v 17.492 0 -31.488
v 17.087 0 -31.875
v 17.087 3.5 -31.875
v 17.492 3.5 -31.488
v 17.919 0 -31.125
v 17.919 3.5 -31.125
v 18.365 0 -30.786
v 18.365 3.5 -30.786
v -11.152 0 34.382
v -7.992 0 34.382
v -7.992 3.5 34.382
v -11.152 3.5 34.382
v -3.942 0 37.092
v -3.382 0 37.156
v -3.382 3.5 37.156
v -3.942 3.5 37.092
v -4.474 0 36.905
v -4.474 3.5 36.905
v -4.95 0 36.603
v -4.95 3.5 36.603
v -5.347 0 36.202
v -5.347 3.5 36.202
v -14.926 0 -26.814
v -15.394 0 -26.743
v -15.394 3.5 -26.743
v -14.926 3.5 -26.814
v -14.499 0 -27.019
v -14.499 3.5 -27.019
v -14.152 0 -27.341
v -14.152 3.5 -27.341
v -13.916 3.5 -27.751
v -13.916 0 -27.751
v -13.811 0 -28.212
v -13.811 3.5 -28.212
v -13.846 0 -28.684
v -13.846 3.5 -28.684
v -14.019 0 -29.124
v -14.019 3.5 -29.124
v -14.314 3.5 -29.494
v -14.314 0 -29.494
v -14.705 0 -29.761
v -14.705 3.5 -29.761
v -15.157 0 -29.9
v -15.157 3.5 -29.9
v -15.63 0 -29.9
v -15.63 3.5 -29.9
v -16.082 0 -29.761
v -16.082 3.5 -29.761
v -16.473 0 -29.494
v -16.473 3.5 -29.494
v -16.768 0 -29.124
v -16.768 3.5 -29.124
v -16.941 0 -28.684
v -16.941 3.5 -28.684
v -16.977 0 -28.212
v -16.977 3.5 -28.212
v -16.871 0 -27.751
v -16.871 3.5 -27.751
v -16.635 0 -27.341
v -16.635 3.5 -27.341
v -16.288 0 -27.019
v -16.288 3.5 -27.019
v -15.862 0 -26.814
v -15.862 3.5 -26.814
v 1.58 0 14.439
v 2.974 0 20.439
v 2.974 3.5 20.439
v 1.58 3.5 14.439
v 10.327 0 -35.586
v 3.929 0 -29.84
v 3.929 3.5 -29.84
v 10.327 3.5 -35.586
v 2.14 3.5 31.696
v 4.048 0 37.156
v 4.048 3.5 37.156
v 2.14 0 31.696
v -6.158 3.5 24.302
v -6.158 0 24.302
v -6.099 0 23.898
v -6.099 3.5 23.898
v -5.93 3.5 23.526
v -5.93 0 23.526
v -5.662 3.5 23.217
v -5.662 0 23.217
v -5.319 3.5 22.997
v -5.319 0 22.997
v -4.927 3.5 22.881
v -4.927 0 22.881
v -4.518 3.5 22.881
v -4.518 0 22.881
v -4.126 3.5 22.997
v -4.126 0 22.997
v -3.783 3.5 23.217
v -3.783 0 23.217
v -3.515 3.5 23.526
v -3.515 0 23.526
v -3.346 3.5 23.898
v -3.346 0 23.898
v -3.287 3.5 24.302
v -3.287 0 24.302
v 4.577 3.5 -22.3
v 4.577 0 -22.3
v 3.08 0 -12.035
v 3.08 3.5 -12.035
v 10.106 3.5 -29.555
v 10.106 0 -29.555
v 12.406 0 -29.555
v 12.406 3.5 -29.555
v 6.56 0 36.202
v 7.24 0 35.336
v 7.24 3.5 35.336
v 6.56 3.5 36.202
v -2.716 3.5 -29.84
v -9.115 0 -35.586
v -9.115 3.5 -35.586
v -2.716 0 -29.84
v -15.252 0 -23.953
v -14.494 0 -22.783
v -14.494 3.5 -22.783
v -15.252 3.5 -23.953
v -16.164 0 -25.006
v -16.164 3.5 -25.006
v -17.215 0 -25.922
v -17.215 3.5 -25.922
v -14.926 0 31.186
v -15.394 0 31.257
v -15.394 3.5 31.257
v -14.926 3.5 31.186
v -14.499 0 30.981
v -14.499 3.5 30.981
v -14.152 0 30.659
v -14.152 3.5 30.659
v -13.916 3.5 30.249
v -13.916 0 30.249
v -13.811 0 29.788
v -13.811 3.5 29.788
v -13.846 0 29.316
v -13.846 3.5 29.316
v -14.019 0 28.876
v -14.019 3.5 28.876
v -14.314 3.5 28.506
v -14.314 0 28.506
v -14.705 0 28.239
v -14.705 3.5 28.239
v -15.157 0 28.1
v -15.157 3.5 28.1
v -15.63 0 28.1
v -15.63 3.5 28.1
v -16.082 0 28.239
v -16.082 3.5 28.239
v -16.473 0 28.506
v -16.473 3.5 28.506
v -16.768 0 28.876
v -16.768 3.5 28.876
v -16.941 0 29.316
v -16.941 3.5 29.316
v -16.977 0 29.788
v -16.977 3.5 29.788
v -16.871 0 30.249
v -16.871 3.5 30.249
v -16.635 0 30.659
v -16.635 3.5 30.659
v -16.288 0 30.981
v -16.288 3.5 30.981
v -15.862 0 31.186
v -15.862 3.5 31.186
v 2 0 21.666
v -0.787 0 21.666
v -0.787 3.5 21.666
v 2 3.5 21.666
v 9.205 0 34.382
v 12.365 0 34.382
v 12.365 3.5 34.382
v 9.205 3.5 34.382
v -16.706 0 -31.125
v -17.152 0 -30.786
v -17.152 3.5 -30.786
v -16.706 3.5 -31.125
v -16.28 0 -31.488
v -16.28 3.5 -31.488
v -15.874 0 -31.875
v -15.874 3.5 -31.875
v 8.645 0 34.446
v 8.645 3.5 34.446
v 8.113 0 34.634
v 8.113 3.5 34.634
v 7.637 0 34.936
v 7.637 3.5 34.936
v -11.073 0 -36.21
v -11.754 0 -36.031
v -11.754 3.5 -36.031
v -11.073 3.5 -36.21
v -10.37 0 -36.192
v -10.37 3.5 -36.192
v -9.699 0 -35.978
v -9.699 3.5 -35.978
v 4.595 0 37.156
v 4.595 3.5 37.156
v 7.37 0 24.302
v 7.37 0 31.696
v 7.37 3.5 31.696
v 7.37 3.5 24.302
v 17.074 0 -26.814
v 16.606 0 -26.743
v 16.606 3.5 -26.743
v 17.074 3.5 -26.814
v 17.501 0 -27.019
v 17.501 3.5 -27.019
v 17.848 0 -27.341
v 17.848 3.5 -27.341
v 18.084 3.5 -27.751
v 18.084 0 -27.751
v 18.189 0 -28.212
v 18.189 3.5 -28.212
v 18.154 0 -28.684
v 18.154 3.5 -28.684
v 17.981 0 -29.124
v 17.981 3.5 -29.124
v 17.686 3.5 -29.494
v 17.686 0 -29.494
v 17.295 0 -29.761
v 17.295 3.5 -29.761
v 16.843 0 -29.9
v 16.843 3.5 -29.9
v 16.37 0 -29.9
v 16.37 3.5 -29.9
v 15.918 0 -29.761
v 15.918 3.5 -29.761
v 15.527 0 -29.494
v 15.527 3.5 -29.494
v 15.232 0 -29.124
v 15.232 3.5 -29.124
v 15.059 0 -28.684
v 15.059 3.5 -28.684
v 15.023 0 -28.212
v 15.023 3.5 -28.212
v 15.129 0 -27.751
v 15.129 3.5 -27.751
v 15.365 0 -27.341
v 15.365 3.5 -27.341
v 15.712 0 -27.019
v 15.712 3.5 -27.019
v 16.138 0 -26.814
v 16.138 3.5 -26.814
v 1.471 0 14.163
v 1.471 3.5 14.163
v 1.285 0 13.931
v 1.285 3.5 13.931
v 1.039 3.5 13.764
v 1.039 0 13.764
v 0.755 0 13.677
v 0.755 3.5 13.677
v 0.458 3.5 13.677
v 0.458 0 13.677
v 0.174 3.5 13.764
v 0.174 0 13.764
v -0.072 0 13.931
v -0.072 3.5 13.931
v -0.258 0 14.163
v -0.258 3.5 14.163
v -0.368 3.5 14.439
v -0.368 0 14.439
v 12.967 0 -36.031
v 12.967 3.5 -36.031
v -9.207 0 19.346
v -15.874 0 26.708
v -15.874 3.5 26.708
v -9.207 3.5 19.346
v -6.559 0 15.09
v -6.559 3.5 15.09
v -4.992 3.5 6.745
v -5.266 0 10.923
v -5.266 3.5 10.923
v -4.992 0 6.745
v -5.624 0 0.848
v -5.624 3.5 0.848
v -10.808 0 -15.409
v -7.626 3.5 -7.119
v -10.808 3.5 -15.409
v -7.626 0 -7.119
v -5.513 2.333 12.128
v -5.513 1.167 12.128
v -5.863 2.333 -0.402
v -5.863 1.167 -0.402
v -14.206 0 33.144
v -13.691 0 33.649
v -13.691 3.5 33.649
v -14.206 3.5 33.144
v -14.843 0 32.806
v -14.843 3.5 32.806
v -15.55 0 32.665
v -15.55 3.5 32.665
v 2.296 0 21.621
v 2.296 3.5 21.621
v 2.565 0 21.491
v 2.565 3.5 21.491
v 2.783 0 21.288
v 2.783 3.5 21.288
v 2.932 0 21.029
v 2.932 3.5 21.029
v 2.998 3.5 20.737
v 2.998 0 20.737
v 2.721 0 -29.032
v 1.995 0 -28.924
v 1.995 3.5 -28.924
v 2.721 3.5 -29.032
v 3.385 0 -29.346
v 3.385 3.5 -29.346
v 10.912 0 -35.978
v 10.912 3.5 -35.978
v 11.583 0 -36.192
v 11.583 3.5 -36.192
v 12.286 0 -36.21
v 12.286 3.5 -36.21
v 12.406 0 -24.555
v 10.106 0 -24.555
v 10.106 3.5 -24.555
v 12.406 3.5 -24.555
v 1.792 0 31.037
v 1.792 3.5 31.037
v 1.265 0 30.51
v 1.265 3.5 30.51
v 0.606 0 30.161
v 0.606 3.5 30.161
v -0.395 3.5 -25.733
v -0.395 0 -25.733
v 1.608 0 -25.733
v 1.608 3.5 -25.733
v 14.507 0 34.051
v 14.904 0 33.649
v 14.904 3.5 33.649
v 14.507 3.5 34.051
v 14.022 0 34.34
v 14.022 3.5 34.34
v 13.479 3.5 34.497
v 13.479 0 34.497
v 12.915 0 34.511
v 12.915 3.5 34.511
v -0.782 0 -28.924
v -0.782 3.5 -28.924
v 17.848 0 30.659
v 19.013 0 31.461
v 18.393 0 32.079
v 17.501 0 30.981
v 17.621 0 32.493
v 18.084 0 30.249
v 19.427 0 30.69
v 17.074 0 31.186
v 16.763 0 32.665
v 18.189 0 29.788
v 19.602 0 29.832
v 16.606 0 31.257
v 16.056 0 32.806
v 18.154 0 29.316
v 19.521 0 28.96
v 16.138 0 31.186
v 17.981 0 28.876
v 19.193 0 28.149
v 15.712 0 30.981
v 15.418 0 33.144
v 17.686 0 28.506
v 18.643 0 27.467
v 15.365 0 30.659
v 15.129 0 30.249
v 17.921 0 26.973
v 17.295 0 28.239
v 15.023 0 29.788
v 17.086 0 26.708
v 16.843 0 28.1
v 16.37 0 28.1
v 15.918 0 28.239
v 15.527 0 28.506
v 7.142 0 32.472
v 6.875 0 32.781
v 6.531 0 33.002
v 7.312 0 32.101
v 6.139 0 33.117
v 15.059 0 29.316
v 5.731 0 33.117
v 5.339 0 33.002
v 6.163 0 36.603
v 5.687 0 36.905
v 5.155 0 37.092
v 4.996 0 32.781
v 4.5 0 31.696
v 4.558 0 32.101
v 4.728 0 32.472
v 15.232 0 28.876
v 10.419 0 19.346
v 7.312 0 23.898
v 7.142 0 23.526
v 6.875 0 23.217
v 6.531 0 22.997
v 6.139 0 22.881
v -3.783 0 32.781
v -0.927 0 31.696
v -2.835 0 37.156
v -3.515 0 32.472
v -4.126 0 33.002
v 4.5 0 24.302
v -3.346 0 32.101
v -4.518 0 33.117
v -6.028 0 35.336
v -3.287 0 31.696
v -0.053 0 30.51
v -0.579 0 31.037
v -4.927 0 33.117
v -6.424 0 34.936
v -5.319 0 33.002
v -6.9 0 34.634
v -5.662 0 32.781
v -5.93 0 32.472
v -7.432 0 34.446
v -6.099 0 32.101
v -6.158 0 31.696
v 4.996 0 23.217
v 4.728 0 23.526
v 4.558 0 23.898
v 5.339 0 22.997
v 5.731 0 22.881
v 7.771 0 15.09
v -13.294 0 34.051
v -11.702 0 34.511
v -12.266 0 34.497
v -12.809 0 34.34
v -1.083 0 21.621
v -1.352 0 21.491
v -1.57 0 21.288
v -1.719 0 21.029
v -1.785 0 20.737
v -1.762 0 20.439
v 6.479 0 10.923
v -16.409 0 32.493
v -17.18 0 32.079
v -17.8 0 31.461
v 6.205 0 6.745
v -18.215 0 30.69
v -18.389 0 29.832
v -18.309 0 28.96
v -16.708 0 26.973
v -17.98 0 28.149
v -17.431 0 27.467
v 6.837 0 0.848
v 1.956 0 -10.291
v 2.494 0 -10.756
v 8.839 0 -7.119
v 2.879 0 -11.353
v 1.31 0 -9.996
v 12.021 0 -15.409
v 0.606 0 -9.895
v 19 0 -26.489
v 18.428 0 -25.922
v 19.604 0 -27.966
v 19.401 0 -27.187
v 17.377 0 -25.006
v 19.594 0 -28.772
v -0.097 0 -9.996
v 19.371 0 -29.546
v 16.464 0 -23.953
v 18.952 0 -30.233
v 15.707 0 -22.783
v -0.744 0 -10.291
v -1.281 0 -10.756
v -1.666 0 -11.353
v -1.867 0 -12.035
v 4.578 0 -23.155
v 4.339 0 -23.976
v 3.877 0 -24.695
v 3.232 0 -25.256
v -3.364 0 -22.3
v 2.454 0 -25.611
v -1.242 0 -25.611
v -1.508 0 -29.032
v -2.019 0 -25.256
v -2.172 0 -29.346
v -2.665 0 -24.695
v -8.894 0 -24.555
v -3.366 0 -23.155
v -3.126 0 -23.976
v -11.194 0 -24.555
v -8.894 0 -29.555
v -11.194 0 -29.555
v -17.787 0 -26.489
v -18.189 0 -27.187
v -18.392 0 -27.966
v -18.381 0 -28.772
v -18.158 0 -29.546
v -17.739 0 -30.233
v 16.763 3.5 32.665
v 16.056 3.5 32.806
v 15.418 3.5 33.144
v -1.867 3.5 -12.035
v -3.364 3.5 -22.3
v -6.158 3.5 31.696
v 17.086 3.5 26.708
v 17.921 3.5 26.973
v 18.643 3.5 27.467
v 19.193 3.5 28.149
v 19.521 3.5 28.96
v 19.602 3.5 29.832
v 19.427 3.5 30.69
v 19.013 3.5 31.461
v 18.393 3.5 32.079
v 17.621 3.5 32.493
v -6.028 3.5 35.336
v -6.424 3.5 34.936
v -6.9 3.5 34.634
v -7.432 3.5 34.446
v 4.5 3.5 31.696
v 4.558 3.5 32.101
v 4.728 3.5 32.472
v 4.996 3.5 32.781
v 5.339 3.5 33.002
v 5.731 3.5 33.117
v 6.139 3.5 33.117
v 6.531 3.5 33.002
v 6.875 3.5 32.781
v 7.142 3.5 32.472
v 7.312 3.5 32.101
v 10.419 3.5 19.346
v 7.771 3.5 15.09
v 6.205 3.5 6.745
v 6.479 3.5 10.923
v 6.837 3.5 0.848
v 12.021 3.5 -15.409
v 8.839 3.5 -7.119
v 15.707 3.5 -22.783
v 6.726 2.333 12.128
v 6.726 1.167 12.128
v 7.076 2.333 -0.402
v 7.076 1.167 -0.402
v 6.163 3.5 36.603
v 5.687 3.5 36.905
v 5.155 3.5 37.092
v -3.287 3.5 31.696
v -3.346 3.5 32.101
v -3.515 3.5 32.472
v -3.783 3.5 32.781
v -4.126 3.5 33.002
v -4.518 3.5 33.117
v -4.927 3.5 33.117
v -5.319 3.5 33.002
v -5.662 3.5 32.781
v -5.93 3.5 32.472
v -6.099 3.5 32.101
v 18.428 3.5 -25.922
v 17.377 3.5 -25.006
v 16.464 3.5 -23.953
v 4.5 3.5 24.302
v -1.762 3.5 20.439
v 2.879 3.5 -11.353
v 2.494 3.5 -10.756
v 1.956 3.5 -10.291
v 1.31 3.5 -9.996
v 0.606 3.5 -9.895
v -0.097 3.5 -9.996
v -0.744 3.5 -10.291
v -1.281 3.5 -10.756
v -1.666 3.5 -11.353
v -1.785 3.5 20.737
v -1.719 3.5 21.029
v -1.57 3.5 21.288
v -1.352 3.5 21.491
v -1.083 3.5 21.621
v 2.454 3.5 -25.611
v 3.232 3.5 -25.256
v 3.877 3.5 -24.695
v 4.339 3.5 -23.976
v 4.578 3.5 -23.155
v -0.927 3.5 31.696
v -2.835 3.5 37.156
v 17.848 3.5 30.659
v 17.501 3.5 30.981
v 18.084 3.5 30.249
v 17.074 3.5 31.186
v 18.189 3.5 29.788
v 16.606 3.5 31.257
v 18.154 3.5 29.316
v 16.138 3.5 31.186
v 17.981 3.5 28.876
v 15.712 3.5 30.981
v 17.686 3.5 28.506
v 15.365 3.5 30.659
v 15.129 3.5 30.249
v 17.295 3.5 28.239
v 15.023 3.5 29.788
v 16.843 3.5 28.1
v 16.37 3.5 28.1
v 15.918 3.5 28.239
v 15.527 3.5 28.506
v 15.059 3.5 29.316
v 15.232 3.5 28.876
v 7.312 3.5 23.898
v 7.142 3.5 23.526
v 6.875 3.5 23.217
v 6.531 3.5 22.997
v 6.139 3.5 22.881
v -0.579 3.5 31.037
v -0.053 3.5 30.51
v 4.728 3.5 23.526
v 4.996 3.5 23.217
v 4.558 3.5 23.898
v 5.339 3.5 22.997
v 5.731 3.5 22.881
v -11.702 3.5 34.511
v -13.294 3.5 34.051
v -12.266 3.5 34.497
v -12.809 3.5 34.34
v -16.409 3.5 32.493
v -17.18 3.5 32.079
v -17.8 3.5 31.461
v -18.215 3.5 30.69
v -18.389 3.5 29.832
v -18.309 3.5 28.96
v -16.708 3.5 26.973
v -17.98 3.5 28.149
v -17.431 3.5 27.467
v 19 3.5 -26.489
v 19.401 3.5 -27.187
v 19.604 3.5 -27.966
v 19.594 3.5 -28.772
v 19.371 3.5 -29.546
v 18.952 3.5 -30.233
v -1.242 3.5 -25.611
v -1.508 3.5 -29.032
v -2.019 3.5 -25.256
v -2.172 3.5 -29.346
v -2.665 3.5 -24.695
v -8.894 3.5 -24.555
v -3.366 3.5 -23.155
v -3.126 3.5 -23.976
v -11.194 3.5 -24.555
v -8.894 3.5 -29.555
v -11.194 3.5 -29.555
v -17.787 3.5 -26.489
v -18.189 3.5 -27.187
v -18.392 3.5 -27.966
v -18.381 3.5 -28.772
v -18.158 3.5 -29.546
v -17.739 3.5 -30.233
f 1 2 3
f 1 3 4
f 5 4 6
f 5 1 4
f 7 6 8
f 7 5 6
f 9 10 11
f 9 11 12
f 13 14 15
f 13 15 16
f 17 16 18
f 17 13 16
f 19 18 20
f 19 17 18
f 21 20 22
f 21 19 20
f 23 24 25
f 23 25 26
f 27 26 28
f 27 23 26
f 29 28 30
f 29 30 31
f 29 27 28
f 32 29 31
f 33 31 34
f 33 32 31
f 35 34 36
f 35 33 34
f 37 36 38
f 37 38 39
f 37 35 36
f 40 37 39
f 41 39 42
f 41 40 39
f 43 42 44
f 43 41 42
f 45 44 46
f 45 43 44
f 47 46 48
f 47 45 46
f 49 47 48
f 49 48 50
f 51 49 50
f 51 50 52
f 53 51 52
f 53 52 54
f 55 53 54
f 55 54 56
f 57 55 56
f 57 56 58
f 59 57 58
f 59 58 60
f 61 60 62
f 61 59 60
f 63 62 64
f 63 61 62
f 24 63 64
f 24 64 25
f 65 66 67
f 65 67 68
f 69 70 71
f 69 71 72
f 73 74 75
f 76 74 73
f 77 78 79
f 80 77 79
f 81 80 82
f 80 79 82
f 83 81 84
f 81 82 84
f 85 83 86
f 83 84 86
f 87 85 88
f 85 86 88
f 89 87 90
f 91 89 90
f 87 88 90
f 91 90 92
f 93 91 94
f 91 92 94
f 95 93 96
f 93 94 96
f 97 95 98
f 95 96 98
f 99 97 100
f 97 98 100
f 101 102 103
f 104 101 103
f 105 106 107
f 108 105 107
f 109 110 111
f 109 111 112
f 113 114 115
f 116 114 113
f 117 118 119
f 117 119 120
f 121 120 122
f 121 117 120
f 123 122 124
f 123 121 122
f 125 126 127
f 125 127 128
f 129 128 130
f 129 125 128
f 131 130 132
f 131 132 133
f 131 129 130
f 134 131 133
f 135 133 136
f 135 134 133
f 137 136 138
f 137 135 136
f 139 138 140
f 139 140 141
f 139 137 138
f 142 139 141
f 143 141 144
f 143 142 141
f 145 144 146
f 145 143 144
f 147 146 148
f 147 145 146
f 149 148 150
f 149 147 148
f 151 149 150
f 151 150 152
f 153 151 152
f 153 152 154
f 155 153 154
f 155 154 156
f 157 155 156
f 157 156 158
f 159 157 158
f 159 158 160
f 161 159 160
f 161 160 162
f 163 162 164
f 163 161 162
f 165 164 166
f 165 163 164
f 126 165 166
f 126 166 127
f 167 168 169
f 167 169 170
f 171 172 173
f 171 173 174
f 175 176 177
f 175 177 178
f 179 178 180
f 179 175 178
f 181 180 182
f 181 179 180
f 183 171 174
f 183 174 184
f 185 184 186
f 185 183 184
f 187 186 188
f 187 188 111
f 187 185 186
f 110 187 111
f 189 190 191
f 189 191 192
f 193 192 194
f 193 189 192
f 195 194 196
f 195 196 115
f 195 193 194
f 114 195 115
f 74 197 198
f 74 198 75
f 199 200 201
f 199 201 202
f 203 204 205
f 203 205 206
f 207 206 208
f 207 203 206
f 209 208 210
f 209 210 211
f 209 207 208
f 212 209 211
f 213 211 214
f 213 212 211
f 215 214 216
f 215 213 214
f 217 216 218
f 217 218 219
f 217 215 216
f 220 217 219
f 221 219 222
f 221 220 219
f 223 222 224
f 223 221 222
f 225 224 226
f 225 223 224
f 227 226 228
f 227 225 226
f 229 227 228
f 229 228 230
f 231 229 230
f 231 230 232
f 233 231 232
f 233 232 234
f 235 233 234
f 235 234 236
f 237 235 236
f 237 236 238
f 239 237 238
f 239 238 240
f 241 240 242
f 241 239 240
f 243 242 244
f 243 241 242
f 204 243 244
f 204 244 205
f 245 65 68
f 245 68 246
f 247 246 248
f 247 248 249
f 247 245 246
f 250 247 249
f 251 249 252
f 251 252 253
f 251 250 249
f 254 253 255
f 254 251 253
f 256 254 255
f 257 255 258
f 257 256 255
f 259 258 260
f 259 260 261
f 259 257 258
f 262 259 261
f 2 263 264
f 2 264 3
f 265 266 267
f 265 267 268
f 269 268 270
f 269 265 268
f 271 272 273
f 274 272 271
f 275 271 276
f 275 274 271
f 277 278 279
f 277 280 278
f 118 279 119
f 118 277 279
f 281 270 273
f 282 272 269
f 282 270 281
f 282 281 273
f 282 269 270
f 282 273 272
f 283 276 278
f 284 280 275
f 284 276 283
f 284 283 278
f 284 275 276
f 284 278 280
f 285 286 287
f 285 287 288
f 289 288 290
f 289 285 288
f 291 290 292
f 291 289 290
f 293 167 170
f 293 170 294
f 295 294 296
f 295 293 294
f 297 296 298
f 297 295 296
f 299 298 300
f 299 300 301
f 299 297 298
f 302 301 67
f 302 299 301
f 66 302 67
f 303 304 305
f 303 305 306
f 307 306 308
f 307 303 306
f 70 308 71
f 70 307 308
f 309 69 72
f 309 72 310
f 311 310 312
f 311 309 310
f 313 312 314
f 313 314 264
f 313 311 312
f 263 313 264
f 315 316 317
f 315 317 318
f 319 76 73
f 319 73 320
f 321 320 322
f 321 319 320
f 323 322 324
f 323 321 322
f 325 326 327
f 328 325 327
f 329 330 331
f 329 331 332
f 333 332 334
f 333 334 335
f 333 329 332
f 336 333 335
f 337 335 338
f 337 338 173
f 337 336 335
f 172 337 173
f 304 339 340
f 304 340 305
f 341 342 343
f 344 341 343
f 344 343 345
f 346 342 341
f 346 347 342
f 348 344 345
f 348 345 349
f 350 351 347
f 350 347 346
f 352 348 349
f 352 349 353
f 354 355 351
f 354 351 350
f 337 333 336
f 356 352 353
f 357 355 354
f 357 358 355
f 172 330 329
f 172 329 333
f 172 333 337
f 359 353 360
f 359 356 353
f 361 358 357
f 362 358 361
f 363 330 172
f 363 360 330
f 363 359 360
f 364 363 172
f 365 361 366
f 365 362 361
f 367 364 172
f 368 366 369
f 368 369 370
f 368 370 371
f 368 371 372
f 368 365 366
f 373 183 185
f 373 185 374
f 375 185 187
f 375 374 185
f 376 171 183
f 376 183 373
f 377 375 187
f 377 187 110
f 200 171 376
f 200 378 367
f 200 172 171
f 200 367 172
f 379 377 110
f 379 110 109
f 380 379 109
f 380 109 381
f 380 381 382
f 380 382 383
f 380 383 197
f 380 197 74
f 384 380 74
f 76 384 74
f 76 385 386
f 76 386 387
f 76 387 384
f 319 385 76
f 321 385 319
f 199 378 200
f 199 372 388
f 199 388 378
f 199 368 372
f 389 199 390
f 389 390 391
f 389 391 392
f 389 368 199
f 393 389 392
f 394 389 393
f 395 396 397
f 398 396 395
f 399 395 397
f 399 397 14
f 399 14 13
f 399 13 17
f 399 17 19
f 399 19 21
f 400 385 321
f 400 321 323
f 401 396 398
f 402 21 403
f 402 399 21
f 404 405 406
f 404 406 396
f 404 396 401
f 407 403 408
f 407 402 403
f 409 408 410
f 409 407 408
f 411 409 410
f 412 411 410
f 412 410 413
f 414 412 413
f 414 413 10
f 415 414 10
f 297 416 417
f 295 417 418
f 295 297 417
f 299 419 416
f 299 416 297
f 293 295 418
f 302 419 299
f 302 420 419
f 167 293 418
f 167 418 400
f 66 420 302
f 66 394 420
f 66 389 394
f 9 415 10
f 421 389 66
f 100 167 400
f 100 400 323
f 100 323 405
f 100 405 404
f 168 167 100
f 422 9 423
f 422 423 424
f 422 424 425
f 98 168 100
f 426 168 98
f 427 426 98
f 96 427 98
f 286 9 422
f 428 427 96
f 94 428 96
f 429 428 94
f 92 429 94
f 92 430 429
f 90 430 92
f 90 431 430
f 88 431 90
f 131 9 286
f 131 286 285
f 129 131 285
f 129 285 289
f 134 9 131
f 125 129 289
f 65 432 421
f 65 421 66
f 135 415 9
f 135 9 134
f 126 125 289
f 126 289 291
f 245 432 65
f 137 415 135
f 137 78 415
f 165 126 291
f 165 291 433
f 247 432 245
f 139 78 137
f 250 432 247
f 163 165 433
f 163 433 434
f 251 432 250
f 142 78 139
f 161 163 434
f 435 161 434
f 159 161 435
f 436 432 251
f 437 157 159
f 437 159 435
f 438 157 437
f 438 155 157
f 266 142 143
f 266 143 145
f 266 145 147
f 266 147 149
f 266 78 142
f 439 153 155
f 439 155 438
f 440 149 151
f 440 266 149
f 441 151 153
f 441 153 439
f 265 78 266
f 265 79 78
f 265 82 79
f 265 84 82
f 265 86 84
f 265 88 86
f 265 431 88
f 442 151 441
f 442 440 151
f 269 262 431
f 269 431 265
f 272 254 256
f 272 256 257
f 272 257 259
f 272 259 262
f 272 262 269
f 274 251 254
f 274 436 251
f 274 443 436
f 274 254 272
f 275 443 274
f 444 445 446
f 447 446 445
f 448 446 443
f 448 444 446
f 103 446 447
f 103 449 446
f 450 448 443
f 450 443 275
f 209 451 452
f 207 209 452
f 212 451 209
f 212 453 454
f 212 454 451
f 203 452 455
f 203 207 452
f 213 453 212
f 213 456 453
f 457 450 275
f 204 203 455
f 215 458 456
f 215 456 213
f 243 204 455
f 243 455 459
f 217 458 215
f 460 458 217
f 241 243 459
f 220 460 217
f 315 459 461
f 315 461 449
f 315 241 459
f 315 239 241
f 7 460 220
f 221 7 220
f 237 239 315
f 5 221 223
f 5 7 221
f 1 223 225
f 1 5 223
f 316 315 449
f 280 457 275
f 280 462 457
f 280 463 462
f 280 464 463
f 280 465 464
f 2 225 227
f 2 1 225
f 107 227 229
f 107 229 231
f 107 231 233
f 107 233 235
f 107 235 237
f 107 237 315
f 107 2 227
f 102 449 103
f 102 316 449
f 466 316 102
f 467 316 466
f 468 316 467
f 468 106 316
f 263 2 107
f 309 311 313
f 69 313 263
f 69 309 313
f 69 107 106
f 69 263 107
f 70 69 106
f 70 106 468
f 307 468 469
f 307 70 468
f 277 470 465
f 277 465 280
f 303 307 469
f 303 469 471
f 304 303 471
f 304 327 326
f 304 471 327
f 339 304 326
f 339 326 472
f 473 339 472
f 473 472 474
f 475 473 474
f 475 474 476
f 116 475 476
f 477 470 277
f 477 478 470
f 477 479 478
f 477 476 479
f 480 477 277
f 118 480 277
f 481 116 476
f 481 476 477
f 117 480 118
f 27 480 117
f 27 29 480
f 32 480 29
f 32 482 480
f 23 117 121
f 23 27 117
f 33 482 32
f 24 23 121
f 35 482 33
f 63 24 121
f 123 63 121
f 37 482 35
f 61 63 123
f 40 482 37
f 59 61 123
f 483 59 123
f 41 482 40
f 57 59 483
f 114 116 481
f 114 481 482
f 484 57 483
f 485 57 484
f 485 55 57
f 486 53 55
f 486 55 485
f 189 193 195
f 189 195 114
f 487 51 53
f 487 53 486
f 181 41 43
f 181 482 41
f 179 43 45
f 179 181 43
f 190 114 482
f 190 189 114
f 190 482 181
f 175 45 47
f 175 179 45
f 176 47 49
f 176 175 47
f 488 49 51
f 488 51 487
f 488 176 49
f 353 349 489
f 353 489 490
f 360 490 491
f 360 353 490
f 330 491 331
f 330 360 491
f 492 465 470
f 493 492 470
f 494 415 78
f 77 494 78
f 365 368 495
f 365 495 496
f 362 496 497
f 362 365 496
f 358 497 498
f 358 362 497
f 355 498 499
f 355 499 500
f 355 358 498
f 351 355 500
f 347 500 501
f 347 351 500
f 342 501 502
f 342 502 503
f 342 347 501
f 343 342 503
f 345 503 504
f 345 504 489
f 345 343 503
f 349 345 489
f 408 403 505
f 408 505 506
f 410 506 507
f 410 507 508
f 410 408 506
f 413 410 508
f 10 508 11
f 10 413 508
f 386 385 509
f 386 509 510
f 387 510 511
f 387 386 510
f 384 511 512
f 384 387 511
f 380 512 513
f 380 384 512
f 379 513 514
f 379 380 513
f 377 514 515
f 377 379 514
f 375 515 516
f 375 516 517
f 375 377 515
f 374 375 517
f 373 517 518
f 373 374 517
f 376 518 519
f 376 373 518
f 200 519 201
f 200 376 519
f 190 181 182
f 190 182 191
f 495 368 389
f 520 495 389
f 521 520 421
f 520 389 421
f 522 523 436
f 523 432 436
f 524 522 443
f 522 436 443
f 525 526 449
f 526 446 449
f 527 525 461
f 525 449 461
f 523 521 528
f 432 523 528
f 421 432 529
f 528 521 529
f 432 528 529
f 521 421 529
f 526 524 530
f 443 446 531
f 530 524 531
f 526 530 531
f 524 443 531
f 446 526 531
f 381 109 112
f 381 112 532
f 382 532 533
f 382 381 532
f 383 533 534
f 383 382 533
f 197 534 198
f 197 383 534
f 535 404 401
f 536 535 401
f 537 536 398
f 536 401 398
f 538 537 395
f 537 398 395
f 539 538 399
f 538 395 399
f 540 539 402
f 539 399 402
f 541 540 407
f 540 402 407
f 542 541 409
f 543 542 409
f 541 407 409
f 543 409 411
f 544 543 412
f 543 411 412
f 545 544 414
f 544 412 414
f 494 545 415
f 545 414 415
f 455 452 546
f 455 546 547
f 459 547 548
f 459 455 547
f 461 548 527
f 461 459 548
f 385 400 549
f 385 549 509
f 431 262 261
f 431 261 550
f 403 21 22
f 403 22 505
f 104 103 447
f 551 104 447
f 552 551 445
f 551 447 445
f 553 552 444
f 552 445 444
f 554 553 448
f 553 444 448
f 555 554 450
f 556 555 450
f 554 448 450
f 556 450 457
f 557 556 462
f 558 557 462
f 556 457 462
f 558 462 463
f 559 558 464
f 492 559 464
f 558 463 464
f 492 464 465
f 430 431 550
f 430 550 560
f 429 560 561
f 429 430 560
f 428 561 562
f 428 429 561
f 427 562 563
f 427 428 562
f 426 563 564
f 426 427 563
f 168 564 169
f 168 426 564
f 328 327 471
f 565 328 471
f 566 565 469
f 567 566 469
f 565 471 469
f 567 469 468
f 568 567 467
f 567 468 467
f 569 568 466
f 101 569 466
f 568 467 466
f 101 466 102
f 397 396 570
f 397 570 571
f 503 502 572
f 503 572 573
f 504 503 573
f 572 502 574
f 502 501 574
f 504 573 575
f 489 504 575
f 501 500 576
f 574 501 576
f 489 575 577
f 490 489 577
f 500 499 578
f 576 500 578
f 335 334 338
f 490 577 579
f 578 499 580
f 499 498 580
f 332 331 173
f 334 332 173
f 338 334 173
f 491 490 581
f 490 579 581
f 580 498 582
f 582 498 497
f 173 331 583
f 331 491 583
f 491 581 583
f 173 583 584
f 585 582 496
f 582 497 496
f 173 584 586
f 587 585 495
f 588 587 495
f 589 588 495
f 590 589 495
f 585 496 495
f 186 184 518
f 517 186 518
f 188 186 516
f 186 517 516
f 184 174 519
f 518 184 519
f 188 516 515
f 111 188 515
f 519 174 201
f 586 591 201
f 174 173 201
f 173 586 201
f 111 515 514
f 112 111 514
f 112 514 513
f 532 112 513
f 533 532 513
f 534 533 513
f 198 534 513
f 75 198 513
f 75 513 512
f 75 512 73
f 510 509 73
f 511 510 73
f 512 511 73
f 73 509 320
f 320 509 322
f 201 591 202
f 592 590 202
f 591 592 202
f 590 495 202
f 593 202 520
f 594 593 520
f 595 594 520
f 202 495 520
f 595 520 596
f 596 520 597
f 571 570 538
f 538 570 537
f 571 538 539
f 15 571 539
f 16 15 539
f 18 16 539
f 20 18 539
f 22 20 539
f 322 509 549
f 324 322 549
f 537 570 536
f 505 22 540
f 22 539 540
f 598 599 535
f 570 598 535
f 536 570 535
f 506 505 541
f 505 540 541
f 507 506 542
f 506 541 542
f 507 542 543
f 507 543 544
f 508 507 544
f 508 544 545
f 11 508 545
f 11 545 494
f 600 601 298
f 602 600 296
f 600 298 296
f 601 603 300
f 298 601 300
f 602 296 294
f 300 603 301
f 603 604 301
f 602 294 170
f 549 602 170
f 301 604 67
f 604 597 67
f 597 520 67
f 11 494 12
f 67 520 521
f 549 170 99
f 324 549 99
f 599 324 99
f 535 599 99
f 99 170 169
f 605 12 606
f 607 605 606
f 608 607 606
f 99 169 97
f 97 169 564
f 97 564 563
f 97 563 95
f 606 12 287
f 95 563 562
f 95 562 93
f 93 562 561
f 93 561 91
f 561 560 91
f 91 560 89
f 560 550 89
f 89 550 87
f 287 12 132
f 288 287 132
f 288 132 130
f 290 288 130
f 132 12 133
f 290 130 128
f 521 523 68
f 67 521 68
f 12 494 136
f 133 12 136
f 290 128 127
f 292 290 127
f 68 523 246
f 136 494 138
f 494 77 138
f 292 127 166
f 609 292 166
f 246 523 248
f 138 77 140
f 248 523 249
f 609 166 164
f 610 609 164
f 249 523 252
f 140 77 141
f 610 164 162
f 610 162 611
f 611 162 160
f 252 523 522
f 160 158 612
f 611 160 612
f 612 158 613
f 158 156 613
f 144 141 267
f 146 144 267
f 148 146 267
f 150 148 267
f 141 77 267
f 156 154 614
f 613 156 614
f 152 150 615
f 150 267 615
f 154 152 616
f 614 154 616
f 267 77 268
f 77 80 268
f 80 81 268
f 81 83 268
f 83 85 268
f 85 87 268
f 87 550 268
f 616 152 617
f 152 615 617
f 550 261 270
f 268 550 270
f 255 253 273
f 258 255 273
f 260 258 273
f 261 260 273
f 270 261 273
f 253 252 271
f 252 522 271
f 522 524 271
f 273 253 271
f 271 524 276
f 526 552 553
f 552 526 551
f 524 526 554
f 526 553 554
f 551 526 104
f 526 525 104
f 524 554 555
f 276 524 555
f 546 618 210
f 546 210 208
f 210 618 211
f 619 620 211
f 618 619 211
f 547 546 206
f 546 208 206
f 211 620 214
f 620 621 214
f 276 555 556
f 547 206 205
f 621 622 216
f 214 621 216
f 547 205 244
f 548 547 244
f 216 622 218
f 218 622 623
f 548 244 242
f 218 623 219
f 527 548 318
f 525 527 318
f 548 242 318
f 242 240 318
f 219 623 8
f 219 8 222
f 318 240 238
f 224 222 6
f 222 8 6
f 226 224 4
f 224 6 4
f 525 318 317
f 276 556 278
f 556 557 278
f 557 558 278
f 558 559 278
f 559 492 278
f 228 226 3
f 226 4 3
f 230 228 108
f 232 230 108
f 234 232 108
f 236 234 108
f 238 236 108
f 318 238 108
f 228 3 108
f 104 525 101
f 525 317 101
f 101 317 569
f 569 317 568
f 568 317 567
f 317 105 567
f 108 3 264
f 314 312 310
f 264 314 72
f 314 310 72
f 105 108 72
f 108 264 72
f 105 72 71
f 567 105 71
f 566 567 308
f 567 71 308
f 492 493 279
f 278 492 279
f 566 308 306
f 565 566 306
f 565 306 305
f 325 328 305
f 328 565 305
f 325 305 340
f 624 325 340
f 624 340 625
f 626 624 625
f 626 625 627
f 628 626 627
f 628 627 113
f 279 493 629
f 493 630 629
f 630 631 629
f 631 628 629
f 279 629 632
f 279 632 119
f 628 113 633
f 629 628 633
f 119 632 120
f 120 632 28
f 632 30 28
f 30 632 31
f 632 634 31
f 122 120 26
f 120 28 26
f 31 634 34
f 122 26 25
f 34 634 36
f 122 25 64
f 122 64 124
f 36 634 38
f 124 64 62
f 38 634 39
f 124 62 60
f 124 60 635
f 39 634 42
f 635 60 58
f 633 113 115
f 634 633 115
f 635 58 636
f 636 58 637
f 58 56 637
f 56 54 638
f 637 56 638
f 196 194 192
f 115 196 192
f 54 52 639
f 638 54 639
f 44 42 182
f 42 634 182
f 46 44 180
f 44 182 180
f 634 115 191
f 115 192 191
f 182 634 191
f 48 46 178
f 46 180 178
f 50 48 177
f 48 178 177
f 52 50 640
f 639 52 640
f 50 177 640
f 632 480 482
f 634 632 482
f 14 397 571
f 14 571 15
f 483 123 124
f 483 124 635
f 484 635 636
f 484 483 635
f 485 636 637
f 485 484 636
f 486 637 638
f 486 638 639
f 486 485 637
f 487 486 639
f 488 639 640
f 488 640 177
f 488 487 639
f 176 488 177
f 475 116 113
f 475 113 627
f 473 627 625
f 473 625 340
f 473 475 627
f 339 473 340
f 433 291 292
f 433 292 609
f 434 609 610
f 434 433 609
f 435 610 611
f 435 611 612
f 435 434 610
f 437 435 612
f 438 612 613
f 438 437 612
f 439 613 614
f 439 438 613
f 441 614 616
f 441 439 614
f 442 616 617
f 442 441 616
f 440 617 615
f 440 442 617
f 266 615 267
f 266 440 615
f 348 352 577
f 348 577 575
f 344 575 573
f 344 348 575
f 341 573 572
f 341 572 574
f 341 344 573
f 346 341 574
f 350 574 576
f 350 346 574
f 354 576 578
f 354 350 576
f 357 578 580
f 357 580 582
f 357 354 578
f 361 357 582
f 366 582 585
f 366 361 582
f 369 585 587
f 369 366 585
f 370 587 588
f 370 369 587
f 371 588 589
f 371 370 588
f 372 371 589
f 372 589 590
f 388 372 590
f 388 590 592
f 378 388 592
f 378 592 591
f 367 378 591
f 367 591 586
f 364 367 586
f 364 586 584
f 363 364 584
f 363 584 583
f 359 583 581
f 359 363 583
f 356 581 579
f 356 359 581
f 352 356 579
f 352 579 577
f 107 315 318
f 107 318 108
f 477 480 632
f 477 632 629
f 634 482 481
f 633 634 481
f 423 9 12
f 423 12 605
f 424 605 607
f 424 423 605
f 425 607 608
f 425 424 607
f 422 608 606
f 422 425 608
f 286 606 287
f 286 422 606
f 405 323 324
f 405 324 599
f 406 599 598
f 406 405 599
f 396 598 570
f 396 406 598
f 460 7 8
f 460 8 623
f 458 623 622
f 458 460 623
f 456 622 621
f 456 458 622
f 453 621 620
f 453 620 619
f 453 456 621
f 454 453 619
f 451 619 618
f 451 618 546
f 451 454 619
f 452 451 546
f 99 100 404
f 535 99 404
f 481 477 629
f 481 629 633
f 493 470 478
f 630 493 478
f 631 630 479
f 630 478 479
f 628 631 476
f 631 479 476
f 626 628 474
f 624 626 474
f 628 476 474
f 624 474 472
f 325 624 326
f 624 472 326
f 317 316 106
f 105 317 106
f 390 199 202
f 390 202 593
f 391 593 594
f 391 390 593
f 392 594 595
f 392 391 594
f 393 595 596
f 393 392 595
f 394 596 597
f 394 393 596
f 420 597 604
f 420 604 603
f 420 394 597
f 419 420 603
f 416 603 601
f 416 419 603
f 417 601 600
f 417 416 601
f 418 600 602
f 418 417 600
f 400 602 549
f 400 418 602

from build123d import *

# Parameters (mm, degrees)
CROQUIS1_R              = 1.5875
CROQUIS1_W              = 2.3
CROQUIS1_H              = 5
SALIENTE_EXTRUIR1_DEPTH = 3.5


with BuildPart() as part:
    # Croquis1 → Saliente-Extruir1 (new body)
    with BuildSketch(Plane(origin=(0, 0, 0), x_dir=(1, 0, 0), z_dir=(0, 1, 0))):
        with BuildLine():
            Line((-15.874295221, 31.874668373), (-11.754060701, 36.031005585))
            ThreePointArc((-11.754060701, 36.031005585), (-10.369805081, 36.191711772), (-9.114574915, 35.586412398))
            Line((-9.114574915, 35.586412398), (-2.716116368, 29.839829039))
            ThreePointArc((-2.716116368, 29.839829039), (-1.851993104, 29.164348948), (-0.781901657, 28.923752474))
            Line((-0.781901657, 28.923752474), (0.565649151, 28.923752474))
            Line((0.565649151, 28.923752474), (0.647095514, 28.923752474))
            Line((0.647095514, 28.923752474), (1.994646322, 28.923752474))
            ThreePointArc((1.994646322, 28.923752474), (3.06473777, 29.164348948), (3.928861034, 29.839829039))
            Line((3.928861034, 29.839829039), (10.327319581, 35.586412398))
            ThreePointArc((10.327319581, 35.586412398), (11.582549747, 36.191711772), (12.966805367, 36.031005585))
            Line((12.966805367, 36.031005585), (17.087039886, 31.874668373))
            ThreePointArc((17.087039886, 31.874668373), (17.703192062, 31.303268278), (18.365142407, 30.785616548))
            ThreePointArc((18.365142407, 30.785616548), (19.626123842, 28.369336027), (18.427544181, 25.921501773))
            ThreePointArc((18.427544181, 25.921501773), (16.902388008, 24.495249114), (15.706675307, 22.783358599))
            add(Edge.make_bspline(
                [(17.08637633, -26.708053998), (12.010093305, -21.41999504), (5.252678849, -14.724182661), (6.940083791, 4.589437635), (12.242427811, 16.518318459), (15.706675307, 22.783358599)],
                knots=[0, 0, 0, 0, 0.308743397, 0.525126437, 0.93919625, 0.93919625, 0.93919625, 0.93919625], degree=3))
            ThreePointArc((17.08637633, -26.708053998), (19.60196336, -29.831990985), (16.763044461, -32.665310574))
            ThreePointArc((16.763044461, -32.665310574), (15.724835901, -32.951926252), (14.903555585, -33.648721922))
            ThreePointArc((14.903555585, -33.648721922), (13.755521453, -34.435837646), (12.364591814, -34.382468459))
            Line((12.364591814, -34.382468459), (9.205112275, -34.382468459))
            ThreePointArc((9.205112275, -34.382468459), (8.113093326, -34.633581042), (7.240450136, -35.336472768))
            Line((7.240450136, -35.336472768), (6.559598907, -36.201703273))
            ThreePointArc((6.559598907, -36.201703273), (5.686955717, -36.904594998), (4.594936767, -37.155707581))
            Line((4.594936767, -37.155707581), (4.047588743, -37.155707581))
            Line((4.047588743, -37.155707581), (2.140229158, -31.696312325))
            ThreePointArc((2.140229158, -31.696312325), (1.548523338, -30.753735958), (0.606372333, -30.161353086))
            ThreePointArc((0.606372333, -30.161353086), (-0.335778672, -30.753735958), (-0.927484492, -31.696312325))
            Line((-0.927484492, -31.696312325), (-2.834844078, -37.155707581))
            Line((-2.834844078, -37.155707581), (-3.382192102, -37.155707581))
            ThreePointArc((-3.382192102, -37.155707581), (-4.474211051, -36.904594998), (-5.346854241, -36.201703273))
            Line((-5.346854241, -36.201703273), (-6.02770547, -35.336472768))
            ThreePointArc((-6.02770547, -35.336472768), (-6.90034866, -34.633581042), (-7.99236761, -34.382468459))
            Line((-7.99236761, -34.382468459), (-11.151847148, -34.382468459))
            ThreePointArc((-11.151847148, -34.382468459), (-12.542776787, -34.435837646), (-13.690810919, -33.648721922))
            ThreePointArc((-13.690810919, -33.648721922), (-14.512091235, -32.951926252), (-15.550299796, -32.665310574))
            ThreePointArc((-15.550299796, -32.665310574), (-18.389218694, -29.831990985), (-15.873631664, -26.708053998))
            add(Edge.make_bspline(
                [(-15.873631664, -26.708053998), (-10.797348639, -21.41999504), (-4.039934183, -14.724182661), (-5.727339125, 4.589437635), (-11.029683145, 16.518318459), (-14.493930641, 22.783358599)],
                knots=[0, 0, 0, 0, 0.308743397, 0.525126437, 0.93919625, 0.93919625, 0.93919625, 0.93919625], degree=3))
            ThreePointArc((-14.493930641, 22.783358599), (-15.689643342, 24.495249114), (-17.214799516, 25.921501773))
            ThreePointArc((-17.214799516, 25.921501773), (-18.413379177, 28.369336027), (-17.152397742, 30.785616548))
            ThreePointArc((-17.152397742, 30.785616548), (-16.490447396, 31.303268278), (-15.874295221, 31.874668373))
        make_face()
        with Locations(Location((16.606372333, -29.669404393, 0), (0, 0, 270))):
            Circle(CROQUIS1_R, mode=Mode.SUBTRACT)
        with Locations(Location((-15.393627667, 28.330595607, 0), (0, 0, 270))):
            Circle(CROQUIS1_R, mode=Mode.SUBTRACT)
        with Locations(Location((16.606372333, 28.330595607, 0), (0, 0, 270))):
            Circle(CROQUIS1_R, mode=Mode.SUBTRACT)
        with Locations(Location((-15.393627667, -29.669404393, 0), (0, 0, 270))):
            Circle(CROQUIS1_R, mode=Mode.SUBTRACT)
        with BuildLine():
            Line((-3.287471504, -24.301852689), (-3.287471504, -31.696312325))
            ThreePointArc((-3.287471504, -31.696312325), (-4.722504291, -33.131345111), (-6.157537077, -31.696312325))
            Line((-6.157537077, -31.696312325), (-6.157537077, -24.301852689))
            ThreePointArc((-6.157537077, -24.301852689), (-4.722504291, -22.866819903), (-3.287471504, -24.301852689))
        make_face(mode=Mode.SUBTRACT)
        with BuildLine():
            Line((-0.787449287, -21.665575324), (2.000193952, -21.665575324))
            ThreePointArc((2.000193952, -21.665575324), (2.783225968, -21.287556725), (2.974256652, -20.439297049))
            Line((2.974256652, -20.439297049), (1.580435032, -14.439297049))
            ThreePointArc((1.580435032, -14.439297049), (0.606372333, -13.665575324), (-0.367690367, -14.439297049))
            Line((-0.367690367, -14.439297049), (-1.761511986, -20.439297049))
            ThreePointArc((-1.761511986, -20.439297049), (-1.570481302, -21.287556725), (-0.787449287, -21.665575324))
        make_face(mode=Mode.SUBTRACT)
        with BuildLine():
            Line((4.50021617, -24.301852689), (4.50021617, -31.696312325))
            ThreePointArc((4.50021617, -31.696312325), (5.935248956, -33.131345111), (7.370281743, -31.696312325))
            Line((7.370281743, -31.696312325), (7.370281743, -24.301852689))
            ThreePointArc((7.370281743, -24.301852689), (5.935248956, -22.866819903), (4.50021617, -24.301852689))
        make_face(mode=Mode.SUBTRACT)
        with BuildLine():
            Line((-0.39543432, 25.732977828), (1.608178986, 25.732977828))
            ThreePointArc((1.608178986, 25.732977828), (3.877356766, 24.695331568), (4.576798655, 22.300199296))
            Line((4.576798655, 22.300199296), (3.080222057, 12.034517445))
            ThreePointArc((3.080222057, 12.034517445), (0.606372333, 9.895166222), (-1.867477392, 12.034517445))
            Line((-1.867477392, 12.034517445), (-3.364053989, 22.300199296))
            ThreePointArc((-3.364053989, 22.300199296), (-2.6646121, 24.695331568), (-0.39543432, 25.732977828))
        make_face(mode=Mode.SUBTRACT)
        with Locations((-10.043627667, 27.05538099)):
            Rectangle(CROQUIS1_W, CROQUIS1_H, mode=Mode.SUBTRACT)
        with Locations((11.256372333, 27.05538099)):
            Rectangle(CROQUIS1_W, CROQUIS1_H, mode=Mode.SUBTRACT)
    extrude(amount=SALIENTE_EXTRUIR1_DEPTH)


solid = part.part
